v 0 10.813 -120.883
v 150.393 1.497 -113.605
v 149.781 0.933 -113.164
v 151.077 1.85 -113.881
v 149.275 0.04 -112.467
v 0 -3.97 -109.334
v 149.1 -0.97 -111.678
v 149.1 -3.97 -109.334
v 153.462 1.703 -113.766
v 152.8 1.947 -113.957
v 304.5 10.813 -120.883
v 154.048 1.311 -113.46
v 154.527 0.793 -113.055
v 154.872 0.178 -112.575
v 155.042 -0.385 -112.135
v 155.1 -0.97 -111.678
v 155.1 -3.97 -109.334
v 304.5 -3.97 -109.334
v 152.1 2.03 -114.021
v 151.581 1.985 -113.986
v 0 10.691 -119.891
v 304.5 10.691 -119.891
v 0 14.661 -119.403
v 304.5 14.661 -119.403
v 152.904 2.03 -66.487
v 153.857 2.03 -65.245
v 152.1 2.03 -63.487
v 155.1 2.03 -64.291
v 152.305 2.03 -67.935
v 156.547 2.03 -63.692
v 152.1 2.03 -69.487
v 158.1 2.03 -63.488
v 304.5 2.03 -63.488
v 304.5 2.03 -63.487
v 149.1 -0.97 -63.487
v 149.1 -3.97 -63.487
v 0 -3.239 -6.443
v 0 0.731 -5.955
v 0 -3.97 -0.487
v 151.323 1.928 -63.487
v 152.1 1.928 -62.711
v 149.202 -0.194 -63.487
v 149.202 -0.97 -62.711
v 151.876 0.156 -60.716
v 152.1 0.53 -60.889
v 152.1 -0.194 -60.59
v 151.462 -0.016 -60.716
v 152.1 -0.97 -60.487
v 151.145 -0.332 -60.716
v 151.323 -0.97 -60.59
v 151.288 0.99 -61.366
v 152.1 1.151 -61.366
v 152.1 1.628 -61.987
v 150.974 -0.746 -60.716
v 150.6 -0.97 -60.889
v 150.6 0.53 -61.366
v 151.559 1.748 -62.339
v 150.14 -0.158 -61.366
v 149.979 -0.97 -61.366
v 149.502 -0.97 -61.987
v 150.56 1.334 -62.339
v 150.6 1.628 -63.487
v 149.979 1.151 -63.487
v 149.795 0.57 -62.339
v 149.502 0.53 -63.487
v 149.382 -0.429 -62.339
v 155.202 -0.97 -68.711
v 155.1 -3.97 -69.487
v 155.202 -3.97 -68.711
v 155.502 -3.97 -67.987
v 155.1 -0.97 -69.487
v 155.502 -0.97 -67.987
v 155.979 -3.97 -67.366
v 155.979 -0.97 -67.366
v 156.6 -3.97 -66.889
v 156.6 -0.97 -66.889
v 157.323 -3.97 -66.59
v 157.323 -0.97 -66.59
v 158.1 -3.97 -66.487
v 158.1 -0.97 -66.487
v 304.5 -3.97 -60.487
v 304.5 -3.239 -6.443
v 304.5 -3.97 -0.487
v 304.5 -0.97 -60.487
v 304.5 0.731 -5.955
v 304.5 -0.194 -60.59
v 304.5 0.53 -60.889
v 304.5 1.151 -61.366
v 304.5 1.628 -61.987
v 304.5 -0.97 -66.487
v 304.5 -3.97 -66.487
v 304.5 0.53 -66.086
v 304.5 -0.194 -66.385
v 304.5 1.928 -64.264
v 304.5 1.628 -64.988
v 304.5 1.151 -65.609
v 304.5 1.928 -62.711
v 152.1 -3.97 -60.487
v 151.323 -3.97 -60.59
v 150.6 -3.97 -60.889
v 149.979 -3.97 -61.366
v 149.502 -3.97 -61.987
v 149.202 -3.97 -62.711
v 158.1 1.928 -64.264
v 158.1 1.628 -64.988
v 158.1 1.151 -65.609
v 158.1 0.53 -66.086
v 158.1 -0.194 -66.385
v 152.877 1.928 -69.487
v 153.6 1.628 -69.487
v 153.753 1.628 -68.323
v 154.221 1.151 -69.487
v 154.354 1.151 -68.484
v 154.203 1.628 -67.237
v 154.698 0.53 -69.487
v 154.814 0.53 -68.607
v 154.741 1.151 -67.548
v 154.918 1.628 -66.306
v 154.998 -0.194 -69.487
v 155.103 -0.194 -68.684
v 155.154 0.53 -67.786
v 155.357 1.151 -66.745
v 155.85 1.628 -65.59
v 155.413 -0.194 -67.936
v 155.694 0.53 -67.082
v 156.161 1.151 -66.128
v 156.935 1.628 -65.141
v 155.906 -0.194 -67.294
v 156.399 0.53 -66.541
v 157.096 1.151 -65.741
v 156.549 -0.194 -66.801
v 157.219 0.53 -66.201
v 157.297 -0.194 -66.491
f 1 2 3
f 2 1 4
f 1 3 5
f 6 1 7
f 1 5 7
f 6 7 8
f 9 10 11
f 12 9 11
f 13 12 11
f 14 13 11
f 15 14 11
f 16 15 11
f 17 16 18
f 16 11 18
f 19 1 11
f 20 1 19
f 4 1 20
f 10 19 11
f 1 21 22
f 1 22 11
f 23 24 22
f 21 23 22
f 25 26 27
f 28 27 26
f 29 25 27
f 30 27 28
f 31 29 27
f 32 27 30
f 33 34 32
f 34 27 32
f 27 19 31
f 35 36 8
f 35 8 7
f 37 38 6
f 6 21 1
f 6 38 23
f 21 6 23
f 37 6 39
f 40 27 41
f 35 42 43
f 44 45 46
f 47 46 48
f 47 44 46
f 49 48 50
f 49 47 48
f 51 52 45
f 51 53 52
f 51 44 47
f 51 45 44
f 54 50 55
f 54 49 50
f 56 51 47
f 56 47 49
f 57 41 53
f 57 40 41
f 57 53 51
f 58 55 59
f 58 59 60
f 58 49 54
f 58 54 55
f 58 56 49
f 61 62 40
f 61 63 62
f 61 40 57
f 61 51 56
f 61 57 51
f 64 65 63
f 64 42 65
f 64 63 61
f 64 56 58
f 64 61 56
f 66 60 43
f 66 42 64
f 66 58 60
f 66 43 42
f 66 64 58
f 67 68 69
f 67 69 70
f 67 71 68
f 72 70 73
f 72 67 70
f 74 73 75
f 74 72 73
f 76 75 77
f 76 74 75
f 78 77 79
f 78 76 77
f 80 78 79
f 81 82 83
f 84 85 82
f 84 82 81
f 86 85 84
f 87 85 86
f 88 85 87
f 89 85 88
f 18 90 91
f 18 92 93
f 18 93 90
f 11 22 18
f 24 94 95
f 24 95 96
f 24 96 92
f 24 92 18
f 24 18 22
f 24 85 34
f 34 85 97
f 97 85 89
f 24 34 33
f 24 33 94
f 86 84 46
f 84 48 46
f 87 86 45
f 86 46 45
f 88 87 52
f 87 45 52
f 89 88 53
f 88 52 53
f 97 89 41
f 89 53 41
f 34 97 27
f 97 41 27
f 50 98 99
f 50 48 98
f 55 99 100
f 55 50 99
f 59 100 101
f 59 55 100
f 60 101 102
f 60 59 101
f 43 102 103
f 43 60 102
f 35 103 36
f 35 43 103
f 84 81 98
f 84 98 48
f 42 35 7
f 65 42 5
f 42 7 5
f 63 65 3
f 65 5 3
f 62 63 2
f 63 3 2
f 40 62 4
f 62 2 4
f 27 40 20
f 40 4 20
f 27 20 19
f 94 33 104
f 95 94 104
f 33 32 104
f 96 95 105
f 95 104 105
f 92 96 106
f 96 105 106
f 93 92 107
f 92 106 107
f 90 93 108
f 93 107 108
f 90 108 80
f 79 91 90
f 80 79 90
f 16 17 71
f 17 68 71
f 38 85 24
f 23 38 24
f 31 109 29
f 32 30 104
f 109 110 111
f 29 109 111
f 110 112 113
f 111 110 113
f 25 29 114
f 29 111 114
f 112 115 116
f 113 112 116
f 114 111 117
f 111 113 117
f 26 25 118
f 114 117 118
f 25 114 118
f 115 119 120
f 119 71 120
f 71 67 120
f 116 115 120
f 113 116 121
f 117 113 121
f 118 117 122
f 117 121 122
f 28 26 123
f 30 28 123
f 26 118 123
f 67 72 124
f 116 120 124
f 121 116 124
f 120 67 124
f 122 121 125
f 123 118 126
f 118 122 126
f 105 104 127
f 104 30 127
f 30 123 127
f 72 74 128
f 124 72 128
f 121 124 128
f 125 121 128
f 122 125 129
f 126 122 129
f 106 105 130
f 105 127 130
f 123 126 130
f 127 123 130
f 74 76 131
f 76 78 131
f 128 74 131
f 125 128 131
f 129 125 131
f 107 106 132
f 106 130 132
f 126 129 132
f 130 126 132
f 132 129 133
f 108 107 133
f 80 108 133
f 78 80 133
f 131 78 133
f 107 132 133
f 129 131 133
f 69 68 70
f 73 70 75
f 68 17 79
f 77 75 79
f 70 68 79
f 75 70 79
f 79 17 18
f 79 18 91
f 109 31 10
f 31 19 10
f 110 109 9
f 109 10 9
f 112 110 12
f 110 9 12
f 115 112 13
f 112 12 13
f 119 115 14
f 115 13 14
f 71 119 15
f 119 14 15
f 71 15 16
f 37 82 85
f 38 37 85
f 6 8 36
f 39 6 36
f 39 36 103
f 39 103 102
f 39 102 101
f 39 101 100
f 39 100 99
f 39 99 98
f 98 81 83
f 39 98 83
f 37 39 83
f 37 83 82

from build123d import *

# Parameters (mm, degrees)
SKETCH2_W           = 121.3
SKETCH2_H           = 304.5
BOSS_EXTRUDE1_DEPTH = 20
CUT_EXTRUDE2_DEPTH  = 329.94119958
SKETCH6_W           = 6
SKETCH6_H           = 6
CUT_EXTRUDE3_DEPTH  = 155.4
SKETCH8_W           = 6
SKETCH8_H           = 6
CUT_EXTRUDE4_DEPTH  = 312.915359451
FILLET2_R           = 3


with BuildPart() as part:
    # Sketch2 → Boss-Extrude1 (new body)
    with BuildSketch(Plane(origin=(0, 0, 0), x_dir=(0, 0.12186934340514809, -0.992546151641322), z_dir=(0, -0.992546151641322, -0.12186934340514809))):
        with Locations((60.65, 152.25)):
            Rectangle(SKETCH2_W, SKETCH2_H)
    extrude(amount=BOSS_EXTRUDE1_DEPTH)

    # Sketch4 → Cut-Extrude2 (cut, through all)
    with BuildSketch(Plane(origin=(304.5, 0, 0), x_dir=(0, 0, -1), z_dir=(1, 0, 0))):
        Polygon((109.333774414, -3.970184607), (0.487477374, -3.970184607), (2.437386868, -19.850923033), (122.833235062, -5.068171678), (120.883325568, 10.812566748), align=None)
        Polygon((5.95527691, 0.73121606), (0, 0), (0.487477374, -3.970184607), (6.442754283, -3.238968546), align=None)
        Polygon((120.883325568, 10.812566748), (120.395848194, 14.782751355), (119.403302042, 14.660882012), (119.890779416, 10.690697405), align=None)
    extrude(amount=-CUT_EXTRUDE2_DEPTH, mode=Mode.SUBTRACT)

    # Sketch6 → Cut-Extrude3 (cut)
    with BuildSketch(Plane(origin=(304.5, 0, 0), x_dir=(0, 0, -1), z_dir=(1, 0, 0))):
        with Locations((63.487477374, -0.970184607)):
            Rectangle(SKETCH6_W, SKETCH6_H)
    extrude(amount=-CUT_EXTRUDE3_DEPTH, mode=Mode.SUBTRACT)

    # Sketch8 → Cut-Extrude4 (cut, through all)
    with BuildSketch(Plane.XY.offset(-66.487477374)):
        with Locations((152.1, -0.970184607)):
            Rectangle(SKETCH8_W, SKETCH8_H)
    extrude(amount=-CUT_EXTRUDE4_DEPTH, mode=Mode.SUBTRACT)

    # Fillet2
    fillet2_edges = [part.edges().sort_by_distance(p)[0] for p in [
        (155.1, 2.029815393, -90.254482773),
        (149.1, 2.029815393, -87.254482773),
        (229.8, 2.029815393, -66.487477374),
        (226.8, 2.029815393, -60.487477374),
        (155.1, -0.970184607, -66.487477374),
        (149.1, -0.970184607, -60.487477374),
    ]]
    fillet(fillet2_edges, radius=FILLET2_R - 0.0001)  # a hair under: the kernel refuses the full size


solid = part.part
